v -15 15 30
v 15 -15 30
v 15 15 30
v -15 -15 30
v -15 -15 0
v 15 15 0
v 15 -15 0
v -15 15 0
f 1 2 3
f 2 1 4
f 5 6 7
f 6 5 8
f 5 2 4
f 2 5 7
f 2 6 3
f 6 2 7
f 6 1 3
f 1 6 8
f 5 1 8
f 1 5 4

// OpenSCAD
// Gold reference: the fixed program — a plain 30mm cube.
size = 30;
translate([-size / 2, -size / 2, 0]) cube([size, size, size]);
